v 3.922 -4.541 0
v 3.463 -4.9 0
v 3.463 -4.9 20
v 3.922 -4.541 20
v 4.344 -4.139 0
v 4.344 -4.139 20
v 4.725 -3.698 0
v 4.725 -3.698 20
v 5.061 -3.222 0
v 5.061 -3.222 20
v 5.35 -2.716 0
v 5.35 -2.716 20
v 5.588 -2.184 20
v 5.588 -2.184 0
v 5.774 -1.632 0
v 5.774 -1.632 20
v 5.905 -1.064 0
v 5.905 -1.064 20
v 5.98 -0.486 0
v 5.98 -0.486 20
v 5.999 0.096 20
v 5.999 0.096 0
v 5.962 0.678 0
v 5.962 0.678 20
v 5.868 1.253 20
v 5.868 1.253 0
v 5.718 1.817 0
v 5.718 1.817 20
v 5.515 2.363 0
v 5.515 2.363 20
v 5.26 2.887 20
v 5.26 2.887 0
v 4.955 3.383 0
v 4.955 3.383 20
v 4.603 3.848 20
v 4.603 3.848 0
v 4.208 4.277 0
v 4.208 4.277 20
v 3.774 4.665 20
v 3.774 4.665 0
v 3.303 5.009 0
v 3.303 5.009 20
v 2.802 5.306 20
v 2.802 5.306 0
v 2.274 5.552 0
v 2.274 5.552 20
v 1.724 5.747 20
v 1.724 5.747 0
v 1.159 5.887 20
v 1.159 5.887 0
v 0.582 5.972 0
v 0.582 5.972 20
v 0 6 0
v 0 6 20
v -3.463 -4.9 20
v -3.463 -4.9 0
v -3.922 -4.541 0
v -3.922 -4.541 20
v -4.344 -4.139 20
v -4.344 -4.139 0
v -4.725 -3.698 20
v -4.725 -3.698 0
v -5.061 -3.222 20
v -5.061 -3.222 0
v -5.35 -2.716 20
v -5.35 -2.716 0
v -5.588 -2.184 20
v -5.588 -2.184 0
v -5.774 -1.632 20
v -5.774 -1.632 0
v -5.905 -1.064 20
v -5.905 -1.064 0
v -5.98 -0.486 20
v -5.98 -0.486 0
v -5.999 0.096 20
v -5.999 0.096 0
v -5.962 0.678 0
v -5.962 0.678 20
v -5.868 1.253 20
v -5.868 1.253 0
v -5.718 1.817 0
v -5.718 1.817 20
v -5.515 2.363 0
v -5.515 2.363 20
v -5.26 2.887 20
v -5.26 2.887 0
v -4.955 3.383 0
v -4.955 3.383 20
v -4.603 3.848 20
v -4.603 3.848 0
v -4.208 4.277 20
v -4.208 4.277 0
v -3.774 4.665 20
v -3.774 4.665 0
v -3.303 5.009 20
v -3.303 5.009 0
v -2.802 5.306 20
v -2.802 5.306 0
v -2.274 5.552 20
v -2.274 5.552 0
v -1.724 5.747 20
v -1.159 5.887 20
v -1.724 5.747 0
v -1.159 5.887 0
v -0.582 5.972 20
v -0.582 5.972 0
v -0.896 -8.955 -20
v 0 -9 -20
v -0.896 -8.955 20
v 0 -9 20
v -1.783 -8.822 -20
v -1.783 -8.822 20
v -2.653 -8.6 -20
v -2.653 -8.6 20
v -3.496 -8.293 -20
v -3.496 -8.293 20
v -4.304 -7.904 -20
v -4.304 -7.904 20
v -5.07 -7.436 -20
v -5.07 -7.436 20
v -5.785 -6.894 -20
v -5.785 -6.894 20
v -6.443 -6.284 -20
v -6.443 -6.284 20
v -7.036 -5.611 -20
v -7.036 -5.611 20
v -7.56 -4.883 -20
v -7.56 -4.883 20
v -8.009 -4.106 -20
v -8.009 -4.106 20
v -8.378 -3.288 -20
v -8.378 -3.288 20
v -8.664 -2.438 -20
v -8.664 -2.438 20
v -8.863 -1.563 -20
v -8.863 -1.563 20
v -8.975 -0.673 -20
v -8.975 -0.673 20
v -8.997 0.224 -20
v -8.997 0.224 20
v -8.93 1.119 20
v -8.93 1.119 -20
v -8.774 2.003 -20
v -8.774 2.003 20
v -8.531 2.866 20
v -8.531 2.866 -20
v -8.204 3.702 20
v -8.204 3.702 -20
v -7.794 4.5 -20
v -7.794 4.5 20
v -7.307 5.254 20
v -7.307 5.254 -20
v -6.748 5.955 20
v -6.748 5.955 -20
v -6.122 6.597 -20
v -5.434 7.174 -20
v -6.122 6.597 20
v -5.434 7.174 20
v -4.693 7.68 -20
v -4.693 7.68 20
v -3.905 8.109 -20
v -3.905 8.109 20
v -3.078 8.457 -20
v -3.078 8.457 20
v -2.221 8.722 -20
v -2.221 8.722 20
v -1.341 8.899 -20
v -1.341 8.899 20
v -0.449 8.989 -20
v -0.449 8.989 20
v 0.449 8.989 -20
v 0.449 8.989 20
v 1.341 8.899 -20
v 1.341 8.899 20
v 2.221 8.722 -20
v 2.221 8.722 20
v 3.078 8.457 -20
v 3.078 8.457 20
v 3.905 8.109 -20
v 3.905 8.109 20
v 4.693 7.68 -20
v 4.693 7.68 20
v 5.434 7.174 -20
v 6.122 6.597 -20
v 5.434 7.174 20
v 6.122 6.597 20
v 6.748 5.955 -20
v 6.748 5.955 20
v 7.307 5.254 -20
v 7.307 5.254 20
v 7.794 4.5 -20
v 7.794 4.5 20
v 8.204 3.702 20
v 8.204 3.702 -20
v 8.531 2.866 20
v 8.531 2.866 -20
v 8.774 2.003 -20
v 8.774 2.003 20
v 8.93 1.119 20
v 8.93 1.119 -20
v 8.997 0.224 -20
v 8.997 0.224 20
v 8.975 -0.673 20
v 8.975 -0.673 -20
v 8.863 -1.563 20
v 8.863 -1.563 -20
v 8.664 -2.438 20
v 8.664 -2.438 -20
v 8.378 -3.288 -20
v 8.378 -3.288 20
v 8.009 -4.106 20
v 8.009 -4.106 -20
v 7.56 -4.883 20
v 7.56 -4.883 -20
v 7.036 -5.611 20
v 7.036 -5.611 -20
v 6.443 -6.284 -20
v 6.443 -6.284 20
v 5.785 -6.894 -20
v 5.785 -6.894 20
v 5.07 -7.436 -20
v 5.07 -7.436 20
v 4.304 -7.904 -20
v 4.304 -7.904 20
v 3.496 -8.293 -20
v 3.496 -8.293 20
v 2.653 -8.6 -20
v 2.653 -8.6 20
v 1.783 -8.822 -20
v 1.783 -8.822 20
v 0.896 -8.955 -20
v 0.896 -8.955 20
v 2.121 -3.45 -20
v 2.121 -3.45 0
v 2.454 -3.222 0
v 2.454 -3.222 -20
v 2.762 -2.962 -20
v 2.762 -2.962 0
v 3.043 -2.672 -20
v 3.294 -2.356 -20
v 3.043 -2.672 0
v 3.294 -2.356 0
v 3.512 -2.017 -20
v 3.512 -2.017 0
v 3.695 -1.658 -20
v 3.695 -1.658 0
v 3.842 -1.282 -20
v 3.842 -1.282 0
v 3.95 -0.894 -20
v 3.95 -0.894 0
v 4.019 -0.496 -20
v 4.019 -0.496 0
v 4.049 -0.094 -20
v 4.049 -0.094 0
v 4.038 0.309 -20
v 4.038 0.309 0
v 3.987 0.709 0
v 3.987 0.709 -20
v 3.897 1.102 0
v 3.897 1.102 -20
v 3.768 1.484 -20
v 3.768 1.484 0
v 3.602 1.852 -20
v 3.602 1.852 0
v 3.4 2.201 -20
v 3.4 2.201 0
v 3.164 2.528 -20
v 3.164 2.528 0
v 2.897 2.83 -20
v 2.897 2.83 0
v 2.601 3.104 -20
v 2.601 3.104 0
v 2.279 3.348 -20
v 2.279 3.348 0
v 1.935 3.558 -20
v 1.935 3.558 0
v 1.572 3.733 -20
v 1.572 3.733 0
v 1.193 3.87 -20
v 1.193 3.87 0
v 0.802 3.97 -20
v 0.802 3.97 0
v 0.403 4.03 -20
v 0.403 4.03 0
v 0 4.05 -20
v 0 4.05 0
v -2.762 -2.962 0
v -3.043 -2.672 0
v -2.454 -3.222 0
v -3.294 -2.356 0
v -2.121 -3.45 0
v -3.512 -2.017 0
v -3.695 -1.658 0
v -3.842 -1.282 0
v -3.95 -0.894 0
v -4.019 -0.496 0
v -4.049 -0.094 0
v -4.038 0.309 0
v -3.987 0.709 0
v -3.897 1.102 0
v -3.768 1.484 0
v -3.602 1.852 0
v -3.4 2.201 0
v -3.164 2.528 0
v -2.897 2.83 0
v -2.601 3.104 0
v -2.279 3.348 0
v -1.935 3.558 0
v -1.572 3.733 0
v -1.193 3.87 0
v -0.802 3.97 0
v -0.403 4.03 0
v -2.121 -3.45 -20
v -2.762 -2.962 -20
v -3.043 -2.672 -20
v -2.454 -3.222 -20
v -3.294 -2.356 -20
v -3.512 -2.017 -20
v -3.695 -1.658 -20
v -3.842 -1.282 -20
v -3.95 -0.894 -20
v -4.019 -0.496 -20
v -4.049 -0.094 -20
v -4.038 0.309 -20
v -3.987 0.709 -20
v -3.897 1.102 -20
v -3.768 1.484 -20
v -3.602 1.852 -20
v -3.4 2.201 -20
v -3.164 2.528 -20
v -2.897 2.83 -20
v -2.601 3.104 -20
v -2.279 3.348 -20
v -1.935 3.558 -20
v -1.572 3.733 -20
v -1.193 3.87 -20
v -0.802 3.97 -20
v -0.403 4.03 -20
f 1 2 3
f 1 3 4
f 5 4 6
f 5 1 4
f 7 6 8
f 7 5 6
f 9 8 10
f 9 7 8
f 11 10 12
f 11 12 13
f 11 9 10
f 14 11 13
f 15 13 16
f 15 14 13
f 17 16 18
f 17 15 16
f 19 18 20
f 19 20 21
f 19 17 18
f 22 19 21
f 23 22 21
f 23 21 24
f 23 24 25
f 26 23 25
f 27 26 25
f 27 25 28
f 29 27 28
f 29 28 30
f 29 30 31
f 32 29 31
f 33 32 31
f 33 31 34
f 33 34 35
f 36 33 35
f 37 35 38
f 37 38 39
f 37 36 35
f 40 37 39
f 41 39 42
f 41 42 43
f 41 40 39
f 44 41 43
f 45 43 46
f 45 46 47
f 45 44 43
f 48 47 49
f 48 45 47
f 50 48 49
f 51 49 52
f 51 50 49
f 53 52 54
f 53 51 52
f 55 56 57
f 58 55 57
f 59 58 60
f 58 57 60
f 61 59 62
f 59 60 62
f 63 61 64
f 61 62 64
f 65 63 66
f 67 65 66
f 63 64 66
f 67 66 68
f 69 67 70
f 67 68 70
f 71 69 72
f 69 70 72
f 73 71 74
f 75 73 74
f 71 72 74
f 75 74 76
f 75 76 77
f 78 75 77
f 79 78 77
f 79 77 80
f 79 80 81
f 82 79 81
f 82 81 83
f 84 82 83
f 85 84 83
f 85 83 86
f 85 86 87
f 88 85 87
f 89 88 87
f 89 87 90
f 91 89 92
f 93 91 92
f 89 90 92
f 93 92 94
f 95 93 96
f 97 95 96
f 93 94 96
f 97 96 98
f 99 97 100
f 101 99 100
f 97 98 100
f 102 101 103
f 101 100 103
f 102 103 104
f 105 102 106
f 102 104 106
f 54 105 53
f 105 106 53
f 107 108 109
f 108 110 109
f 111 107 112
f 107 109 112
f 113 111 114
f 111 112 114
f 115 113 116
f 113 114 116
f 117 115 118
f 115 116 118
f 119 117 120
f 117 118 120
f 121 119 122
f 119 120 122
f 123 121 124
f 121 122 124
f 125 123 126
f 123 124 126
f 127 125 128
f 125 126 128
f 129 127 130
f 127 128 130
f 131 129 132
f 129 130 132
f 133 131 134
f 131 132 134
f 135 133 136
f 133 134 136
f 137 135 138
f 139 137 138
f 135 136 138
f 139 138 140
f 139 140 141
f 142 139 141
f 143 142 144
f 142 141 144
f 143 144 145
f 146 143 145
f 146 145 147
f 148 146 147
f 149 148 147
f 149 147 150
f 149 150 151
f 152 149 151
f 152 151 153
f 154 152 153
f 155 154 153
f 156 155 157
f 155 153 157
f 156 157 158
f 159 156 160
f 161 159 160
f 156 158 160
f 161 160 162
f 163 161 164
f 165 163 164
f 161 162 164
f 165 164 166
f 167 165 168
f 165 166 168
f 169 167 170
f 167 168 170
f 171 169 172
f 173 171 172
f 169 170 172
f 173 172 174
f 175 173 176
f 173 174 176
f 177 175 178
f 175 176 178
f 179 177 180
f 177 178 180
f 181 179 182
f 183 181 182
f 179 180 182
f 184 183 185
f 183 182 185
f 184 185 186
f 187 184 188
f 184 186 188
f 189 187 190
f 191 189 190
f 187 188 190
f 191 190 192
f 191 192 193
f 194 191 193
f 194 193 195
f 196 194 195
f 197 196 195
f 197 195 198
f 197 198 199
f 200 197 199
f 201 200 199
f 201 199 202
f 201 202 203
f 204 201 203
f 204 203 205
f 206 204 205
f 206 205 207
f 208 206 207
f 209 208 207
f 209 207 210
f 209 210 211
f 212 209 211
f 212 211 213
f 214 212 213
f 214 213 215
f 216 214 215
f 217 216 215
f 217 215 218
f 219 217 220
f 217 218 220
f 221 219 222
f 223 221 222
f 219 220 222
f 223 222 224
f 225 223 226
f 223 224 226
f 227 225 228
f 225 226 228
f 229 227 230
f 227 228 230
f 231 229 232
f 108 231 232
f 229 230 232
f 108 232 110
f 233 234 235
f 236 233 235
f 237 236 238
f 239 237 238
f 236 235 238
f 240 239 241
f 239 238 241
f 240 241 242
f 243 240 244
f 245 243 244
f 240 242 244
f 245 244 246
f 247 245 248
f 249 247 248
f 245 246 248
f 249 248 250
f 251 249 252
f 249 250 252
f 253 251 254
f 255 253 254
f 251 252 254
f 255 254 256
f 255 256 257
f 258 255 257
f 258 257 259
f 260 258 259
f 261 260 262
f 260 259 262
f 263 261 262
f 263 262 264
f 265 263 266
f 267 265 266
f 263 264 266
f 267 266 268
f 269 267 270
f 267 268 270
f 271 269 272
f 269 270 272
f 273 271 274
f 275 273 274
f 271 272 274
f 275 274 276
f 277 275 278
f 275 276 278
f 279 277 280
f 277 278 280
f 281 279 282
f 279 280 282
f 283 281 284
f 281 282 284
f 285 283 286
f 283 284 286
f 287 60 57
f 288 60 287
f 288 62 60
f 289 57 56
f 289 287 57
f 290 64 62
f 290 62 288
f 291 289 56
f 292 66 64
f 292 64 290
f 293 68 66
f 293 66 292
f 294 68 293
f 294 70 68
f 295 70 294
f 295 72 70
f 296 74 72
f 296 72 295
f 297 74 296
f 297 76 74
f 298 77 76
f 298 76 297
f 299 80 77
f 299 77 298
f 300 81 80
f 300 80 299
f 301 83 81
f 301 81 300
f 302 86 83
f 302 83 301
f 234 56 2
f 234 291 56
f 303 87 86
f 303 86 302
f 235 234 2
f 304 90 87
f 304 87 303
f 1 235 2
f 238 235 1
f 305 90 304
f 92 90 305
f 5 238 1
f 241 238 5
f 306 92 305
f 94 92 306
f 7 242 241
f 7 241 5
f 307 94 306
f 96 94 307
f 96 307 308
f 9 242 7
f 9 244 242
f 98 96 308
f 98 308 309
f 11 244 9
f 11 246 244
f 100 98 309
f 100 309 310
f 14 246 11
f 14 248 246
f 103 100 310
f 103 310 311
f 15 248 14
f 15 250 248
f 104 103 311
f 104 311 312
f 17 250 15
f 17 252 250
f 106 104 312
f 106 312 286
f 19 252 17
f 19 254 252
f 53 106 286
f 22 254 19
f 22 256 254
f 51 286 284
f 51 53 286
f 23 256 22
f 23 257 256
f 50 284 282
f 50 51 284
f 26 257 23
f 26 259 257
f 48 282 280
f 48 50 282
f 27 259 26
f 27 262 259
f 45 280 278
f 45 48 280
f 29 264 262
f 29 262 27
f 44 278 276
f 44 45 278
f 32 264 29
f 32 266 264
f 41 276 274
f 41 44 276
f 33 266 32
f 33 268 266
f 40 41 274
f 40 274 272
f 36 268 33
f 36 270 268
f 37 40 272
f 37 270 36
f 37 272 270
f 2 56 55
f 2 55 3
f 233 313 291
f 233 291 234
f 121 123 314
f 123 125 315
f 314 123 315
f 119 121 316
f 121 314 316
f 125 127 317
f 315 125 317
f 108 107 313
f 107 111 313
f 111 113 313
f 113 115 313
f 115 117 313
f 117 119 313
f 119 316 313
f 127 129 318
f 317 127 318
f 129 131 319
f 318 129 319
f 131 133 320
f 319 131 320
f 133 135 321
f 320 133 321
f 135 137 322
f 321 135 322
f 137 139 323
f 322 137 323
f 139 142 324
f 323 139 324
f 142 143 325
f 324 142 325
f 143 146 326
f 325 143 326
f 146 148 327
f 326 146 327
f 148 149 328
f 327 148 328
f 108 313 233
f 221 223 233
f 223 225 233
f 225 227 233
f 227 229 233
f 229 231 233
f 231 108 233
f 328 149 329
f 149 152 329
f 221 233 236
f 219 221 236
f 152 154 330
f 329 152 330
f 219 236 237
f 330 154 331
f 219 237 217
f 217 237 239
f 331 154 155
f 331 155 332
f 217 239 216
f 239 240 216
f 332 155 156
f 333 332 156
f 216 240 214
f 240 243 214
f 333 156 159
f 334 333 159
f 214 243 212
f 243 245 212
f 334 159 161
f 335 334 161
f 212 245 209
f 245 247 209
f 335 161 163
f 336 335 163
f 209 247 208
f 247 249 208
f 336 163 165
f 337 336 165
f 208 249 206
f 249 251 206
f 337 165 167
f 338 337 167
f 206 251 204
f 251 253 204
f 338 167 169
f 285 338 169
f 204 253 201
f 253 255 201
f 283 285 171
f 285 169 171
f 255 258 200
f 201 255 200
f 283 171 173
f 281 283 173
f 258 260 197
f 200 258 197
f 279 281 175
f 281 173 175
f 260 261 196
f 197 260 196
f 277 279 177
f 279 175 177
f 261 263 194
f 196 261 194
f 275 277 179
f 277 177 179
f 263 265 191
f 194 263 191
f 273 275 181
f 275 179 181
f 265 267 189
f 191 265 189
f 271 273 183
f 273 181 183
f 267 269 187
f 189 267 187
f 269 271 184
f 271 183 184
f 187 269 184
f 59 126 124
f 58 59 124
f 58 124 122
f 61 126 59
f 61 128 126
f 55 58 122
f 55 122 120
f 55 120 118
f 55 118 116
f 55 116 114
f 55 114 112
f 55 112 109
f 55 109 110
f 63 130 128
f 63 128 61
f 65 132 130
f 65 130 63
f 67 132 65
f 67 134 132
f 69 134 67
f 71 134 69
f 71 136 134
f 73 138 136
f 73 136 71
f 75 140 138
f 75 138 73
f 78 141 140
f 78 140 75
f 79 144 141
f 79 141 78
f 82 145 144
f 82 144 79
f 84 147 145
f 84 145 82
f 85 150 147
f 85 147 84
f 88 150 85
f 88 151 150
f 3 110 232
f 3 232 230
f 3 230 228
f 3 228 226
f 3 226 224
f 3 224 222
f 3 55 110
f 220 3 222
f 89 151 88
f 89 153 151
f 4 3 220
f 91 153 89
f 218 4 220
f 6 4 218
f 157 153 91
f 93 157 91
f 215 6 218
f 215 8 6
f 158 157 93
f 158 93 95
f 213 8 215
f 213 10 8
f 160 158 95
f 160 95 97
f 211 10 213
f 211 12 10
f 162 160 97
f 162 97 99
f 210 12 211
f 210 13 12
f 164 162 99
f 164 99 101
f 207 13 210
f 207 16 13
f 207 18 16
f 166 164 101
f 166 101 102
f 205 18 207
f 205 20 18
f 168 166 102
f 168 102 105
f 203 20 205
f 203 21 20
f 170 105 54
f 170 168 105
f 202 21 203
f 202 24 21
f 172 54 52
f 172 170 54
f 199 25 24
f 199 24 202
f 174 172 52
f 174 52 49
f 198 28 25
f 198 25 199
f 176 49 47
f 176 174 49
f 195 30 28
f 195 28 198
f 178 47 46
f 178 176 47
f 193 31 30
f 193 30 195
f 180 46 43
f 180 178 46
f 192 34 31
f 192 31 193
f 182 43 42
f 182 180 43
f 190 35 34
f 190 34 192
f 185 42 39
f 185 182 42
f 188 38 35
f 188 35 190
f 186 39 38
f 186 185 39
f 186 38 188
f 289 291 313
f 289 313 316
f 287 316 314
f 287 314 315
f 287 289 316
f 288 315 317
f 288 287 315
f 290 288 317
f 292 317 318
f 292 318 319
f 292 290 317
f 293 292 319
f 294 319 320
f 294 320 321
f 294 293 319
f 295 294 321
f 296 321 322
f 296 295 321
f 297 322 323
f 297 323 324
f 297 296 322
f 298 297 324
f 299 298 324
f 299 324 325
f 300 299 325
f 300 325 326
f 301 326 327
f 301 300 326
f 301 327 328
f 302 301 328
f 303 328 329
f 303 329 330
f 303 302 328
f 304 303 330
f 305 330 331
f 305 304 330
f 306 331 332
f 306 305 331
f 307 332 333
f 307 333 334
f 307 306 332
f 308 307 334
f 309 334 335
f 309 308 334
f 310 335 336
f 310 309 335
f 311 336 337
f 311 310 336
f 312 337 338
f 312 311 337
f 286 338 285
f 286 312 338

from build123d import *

# Parameters (mm, degrees)
PAD_DEPTH    = 20
PAD001_DEPTH = 20


with BuildPart() as part:
    # Sketch001 → Pad (new body)
    with BuildSketch(Plane.XY):
        with BuildLine():
            ThreePointArc((3.462658, -4.9), (5.718391, 1.81659), (0, 6))
            Line((0, 6), (0, 9))
            ThreePointArc((0, -9), (9, 0), (0, 9))
            Line((0, -4.9), (0, -9))
            Line((3.462658, -4.9), (0, -4.9))
        make_face()
    pad = extrude(amount=PAD_DEPTH)

    # Sketch002 → Pad001 (join)
    with BuildSketch(Plane.XY):
        with BuildLine():
            ThreePointArc((2.12132, -3.45), (3.897114, 1.10227), (0, 4.05))
            Line((0, 4.05), (0, 9))
            ThreePointArc((0, -9), (9, 0), (0, 9))
            Line((0, -3.45), (0, -9))
            Line((2.12132, -3.45), (0, -3.45))
        make_face()
    pad001 = extrude(amount=-PAD001_DEPTH)

    # Mirrored: Pad, Pad001 across Sketch001 V_Axis
    add(pad.mirror(Plane(origin=(0, 0, 0), x_dir=(0, 0, 1), z_dir=(1, 0, 0))))
    add(pad001.mirror(Plane(origin=(0, 0, 0), x_dir=(0, 0, 1), z_dir=(1, 0, 0))))


solid = part.part
